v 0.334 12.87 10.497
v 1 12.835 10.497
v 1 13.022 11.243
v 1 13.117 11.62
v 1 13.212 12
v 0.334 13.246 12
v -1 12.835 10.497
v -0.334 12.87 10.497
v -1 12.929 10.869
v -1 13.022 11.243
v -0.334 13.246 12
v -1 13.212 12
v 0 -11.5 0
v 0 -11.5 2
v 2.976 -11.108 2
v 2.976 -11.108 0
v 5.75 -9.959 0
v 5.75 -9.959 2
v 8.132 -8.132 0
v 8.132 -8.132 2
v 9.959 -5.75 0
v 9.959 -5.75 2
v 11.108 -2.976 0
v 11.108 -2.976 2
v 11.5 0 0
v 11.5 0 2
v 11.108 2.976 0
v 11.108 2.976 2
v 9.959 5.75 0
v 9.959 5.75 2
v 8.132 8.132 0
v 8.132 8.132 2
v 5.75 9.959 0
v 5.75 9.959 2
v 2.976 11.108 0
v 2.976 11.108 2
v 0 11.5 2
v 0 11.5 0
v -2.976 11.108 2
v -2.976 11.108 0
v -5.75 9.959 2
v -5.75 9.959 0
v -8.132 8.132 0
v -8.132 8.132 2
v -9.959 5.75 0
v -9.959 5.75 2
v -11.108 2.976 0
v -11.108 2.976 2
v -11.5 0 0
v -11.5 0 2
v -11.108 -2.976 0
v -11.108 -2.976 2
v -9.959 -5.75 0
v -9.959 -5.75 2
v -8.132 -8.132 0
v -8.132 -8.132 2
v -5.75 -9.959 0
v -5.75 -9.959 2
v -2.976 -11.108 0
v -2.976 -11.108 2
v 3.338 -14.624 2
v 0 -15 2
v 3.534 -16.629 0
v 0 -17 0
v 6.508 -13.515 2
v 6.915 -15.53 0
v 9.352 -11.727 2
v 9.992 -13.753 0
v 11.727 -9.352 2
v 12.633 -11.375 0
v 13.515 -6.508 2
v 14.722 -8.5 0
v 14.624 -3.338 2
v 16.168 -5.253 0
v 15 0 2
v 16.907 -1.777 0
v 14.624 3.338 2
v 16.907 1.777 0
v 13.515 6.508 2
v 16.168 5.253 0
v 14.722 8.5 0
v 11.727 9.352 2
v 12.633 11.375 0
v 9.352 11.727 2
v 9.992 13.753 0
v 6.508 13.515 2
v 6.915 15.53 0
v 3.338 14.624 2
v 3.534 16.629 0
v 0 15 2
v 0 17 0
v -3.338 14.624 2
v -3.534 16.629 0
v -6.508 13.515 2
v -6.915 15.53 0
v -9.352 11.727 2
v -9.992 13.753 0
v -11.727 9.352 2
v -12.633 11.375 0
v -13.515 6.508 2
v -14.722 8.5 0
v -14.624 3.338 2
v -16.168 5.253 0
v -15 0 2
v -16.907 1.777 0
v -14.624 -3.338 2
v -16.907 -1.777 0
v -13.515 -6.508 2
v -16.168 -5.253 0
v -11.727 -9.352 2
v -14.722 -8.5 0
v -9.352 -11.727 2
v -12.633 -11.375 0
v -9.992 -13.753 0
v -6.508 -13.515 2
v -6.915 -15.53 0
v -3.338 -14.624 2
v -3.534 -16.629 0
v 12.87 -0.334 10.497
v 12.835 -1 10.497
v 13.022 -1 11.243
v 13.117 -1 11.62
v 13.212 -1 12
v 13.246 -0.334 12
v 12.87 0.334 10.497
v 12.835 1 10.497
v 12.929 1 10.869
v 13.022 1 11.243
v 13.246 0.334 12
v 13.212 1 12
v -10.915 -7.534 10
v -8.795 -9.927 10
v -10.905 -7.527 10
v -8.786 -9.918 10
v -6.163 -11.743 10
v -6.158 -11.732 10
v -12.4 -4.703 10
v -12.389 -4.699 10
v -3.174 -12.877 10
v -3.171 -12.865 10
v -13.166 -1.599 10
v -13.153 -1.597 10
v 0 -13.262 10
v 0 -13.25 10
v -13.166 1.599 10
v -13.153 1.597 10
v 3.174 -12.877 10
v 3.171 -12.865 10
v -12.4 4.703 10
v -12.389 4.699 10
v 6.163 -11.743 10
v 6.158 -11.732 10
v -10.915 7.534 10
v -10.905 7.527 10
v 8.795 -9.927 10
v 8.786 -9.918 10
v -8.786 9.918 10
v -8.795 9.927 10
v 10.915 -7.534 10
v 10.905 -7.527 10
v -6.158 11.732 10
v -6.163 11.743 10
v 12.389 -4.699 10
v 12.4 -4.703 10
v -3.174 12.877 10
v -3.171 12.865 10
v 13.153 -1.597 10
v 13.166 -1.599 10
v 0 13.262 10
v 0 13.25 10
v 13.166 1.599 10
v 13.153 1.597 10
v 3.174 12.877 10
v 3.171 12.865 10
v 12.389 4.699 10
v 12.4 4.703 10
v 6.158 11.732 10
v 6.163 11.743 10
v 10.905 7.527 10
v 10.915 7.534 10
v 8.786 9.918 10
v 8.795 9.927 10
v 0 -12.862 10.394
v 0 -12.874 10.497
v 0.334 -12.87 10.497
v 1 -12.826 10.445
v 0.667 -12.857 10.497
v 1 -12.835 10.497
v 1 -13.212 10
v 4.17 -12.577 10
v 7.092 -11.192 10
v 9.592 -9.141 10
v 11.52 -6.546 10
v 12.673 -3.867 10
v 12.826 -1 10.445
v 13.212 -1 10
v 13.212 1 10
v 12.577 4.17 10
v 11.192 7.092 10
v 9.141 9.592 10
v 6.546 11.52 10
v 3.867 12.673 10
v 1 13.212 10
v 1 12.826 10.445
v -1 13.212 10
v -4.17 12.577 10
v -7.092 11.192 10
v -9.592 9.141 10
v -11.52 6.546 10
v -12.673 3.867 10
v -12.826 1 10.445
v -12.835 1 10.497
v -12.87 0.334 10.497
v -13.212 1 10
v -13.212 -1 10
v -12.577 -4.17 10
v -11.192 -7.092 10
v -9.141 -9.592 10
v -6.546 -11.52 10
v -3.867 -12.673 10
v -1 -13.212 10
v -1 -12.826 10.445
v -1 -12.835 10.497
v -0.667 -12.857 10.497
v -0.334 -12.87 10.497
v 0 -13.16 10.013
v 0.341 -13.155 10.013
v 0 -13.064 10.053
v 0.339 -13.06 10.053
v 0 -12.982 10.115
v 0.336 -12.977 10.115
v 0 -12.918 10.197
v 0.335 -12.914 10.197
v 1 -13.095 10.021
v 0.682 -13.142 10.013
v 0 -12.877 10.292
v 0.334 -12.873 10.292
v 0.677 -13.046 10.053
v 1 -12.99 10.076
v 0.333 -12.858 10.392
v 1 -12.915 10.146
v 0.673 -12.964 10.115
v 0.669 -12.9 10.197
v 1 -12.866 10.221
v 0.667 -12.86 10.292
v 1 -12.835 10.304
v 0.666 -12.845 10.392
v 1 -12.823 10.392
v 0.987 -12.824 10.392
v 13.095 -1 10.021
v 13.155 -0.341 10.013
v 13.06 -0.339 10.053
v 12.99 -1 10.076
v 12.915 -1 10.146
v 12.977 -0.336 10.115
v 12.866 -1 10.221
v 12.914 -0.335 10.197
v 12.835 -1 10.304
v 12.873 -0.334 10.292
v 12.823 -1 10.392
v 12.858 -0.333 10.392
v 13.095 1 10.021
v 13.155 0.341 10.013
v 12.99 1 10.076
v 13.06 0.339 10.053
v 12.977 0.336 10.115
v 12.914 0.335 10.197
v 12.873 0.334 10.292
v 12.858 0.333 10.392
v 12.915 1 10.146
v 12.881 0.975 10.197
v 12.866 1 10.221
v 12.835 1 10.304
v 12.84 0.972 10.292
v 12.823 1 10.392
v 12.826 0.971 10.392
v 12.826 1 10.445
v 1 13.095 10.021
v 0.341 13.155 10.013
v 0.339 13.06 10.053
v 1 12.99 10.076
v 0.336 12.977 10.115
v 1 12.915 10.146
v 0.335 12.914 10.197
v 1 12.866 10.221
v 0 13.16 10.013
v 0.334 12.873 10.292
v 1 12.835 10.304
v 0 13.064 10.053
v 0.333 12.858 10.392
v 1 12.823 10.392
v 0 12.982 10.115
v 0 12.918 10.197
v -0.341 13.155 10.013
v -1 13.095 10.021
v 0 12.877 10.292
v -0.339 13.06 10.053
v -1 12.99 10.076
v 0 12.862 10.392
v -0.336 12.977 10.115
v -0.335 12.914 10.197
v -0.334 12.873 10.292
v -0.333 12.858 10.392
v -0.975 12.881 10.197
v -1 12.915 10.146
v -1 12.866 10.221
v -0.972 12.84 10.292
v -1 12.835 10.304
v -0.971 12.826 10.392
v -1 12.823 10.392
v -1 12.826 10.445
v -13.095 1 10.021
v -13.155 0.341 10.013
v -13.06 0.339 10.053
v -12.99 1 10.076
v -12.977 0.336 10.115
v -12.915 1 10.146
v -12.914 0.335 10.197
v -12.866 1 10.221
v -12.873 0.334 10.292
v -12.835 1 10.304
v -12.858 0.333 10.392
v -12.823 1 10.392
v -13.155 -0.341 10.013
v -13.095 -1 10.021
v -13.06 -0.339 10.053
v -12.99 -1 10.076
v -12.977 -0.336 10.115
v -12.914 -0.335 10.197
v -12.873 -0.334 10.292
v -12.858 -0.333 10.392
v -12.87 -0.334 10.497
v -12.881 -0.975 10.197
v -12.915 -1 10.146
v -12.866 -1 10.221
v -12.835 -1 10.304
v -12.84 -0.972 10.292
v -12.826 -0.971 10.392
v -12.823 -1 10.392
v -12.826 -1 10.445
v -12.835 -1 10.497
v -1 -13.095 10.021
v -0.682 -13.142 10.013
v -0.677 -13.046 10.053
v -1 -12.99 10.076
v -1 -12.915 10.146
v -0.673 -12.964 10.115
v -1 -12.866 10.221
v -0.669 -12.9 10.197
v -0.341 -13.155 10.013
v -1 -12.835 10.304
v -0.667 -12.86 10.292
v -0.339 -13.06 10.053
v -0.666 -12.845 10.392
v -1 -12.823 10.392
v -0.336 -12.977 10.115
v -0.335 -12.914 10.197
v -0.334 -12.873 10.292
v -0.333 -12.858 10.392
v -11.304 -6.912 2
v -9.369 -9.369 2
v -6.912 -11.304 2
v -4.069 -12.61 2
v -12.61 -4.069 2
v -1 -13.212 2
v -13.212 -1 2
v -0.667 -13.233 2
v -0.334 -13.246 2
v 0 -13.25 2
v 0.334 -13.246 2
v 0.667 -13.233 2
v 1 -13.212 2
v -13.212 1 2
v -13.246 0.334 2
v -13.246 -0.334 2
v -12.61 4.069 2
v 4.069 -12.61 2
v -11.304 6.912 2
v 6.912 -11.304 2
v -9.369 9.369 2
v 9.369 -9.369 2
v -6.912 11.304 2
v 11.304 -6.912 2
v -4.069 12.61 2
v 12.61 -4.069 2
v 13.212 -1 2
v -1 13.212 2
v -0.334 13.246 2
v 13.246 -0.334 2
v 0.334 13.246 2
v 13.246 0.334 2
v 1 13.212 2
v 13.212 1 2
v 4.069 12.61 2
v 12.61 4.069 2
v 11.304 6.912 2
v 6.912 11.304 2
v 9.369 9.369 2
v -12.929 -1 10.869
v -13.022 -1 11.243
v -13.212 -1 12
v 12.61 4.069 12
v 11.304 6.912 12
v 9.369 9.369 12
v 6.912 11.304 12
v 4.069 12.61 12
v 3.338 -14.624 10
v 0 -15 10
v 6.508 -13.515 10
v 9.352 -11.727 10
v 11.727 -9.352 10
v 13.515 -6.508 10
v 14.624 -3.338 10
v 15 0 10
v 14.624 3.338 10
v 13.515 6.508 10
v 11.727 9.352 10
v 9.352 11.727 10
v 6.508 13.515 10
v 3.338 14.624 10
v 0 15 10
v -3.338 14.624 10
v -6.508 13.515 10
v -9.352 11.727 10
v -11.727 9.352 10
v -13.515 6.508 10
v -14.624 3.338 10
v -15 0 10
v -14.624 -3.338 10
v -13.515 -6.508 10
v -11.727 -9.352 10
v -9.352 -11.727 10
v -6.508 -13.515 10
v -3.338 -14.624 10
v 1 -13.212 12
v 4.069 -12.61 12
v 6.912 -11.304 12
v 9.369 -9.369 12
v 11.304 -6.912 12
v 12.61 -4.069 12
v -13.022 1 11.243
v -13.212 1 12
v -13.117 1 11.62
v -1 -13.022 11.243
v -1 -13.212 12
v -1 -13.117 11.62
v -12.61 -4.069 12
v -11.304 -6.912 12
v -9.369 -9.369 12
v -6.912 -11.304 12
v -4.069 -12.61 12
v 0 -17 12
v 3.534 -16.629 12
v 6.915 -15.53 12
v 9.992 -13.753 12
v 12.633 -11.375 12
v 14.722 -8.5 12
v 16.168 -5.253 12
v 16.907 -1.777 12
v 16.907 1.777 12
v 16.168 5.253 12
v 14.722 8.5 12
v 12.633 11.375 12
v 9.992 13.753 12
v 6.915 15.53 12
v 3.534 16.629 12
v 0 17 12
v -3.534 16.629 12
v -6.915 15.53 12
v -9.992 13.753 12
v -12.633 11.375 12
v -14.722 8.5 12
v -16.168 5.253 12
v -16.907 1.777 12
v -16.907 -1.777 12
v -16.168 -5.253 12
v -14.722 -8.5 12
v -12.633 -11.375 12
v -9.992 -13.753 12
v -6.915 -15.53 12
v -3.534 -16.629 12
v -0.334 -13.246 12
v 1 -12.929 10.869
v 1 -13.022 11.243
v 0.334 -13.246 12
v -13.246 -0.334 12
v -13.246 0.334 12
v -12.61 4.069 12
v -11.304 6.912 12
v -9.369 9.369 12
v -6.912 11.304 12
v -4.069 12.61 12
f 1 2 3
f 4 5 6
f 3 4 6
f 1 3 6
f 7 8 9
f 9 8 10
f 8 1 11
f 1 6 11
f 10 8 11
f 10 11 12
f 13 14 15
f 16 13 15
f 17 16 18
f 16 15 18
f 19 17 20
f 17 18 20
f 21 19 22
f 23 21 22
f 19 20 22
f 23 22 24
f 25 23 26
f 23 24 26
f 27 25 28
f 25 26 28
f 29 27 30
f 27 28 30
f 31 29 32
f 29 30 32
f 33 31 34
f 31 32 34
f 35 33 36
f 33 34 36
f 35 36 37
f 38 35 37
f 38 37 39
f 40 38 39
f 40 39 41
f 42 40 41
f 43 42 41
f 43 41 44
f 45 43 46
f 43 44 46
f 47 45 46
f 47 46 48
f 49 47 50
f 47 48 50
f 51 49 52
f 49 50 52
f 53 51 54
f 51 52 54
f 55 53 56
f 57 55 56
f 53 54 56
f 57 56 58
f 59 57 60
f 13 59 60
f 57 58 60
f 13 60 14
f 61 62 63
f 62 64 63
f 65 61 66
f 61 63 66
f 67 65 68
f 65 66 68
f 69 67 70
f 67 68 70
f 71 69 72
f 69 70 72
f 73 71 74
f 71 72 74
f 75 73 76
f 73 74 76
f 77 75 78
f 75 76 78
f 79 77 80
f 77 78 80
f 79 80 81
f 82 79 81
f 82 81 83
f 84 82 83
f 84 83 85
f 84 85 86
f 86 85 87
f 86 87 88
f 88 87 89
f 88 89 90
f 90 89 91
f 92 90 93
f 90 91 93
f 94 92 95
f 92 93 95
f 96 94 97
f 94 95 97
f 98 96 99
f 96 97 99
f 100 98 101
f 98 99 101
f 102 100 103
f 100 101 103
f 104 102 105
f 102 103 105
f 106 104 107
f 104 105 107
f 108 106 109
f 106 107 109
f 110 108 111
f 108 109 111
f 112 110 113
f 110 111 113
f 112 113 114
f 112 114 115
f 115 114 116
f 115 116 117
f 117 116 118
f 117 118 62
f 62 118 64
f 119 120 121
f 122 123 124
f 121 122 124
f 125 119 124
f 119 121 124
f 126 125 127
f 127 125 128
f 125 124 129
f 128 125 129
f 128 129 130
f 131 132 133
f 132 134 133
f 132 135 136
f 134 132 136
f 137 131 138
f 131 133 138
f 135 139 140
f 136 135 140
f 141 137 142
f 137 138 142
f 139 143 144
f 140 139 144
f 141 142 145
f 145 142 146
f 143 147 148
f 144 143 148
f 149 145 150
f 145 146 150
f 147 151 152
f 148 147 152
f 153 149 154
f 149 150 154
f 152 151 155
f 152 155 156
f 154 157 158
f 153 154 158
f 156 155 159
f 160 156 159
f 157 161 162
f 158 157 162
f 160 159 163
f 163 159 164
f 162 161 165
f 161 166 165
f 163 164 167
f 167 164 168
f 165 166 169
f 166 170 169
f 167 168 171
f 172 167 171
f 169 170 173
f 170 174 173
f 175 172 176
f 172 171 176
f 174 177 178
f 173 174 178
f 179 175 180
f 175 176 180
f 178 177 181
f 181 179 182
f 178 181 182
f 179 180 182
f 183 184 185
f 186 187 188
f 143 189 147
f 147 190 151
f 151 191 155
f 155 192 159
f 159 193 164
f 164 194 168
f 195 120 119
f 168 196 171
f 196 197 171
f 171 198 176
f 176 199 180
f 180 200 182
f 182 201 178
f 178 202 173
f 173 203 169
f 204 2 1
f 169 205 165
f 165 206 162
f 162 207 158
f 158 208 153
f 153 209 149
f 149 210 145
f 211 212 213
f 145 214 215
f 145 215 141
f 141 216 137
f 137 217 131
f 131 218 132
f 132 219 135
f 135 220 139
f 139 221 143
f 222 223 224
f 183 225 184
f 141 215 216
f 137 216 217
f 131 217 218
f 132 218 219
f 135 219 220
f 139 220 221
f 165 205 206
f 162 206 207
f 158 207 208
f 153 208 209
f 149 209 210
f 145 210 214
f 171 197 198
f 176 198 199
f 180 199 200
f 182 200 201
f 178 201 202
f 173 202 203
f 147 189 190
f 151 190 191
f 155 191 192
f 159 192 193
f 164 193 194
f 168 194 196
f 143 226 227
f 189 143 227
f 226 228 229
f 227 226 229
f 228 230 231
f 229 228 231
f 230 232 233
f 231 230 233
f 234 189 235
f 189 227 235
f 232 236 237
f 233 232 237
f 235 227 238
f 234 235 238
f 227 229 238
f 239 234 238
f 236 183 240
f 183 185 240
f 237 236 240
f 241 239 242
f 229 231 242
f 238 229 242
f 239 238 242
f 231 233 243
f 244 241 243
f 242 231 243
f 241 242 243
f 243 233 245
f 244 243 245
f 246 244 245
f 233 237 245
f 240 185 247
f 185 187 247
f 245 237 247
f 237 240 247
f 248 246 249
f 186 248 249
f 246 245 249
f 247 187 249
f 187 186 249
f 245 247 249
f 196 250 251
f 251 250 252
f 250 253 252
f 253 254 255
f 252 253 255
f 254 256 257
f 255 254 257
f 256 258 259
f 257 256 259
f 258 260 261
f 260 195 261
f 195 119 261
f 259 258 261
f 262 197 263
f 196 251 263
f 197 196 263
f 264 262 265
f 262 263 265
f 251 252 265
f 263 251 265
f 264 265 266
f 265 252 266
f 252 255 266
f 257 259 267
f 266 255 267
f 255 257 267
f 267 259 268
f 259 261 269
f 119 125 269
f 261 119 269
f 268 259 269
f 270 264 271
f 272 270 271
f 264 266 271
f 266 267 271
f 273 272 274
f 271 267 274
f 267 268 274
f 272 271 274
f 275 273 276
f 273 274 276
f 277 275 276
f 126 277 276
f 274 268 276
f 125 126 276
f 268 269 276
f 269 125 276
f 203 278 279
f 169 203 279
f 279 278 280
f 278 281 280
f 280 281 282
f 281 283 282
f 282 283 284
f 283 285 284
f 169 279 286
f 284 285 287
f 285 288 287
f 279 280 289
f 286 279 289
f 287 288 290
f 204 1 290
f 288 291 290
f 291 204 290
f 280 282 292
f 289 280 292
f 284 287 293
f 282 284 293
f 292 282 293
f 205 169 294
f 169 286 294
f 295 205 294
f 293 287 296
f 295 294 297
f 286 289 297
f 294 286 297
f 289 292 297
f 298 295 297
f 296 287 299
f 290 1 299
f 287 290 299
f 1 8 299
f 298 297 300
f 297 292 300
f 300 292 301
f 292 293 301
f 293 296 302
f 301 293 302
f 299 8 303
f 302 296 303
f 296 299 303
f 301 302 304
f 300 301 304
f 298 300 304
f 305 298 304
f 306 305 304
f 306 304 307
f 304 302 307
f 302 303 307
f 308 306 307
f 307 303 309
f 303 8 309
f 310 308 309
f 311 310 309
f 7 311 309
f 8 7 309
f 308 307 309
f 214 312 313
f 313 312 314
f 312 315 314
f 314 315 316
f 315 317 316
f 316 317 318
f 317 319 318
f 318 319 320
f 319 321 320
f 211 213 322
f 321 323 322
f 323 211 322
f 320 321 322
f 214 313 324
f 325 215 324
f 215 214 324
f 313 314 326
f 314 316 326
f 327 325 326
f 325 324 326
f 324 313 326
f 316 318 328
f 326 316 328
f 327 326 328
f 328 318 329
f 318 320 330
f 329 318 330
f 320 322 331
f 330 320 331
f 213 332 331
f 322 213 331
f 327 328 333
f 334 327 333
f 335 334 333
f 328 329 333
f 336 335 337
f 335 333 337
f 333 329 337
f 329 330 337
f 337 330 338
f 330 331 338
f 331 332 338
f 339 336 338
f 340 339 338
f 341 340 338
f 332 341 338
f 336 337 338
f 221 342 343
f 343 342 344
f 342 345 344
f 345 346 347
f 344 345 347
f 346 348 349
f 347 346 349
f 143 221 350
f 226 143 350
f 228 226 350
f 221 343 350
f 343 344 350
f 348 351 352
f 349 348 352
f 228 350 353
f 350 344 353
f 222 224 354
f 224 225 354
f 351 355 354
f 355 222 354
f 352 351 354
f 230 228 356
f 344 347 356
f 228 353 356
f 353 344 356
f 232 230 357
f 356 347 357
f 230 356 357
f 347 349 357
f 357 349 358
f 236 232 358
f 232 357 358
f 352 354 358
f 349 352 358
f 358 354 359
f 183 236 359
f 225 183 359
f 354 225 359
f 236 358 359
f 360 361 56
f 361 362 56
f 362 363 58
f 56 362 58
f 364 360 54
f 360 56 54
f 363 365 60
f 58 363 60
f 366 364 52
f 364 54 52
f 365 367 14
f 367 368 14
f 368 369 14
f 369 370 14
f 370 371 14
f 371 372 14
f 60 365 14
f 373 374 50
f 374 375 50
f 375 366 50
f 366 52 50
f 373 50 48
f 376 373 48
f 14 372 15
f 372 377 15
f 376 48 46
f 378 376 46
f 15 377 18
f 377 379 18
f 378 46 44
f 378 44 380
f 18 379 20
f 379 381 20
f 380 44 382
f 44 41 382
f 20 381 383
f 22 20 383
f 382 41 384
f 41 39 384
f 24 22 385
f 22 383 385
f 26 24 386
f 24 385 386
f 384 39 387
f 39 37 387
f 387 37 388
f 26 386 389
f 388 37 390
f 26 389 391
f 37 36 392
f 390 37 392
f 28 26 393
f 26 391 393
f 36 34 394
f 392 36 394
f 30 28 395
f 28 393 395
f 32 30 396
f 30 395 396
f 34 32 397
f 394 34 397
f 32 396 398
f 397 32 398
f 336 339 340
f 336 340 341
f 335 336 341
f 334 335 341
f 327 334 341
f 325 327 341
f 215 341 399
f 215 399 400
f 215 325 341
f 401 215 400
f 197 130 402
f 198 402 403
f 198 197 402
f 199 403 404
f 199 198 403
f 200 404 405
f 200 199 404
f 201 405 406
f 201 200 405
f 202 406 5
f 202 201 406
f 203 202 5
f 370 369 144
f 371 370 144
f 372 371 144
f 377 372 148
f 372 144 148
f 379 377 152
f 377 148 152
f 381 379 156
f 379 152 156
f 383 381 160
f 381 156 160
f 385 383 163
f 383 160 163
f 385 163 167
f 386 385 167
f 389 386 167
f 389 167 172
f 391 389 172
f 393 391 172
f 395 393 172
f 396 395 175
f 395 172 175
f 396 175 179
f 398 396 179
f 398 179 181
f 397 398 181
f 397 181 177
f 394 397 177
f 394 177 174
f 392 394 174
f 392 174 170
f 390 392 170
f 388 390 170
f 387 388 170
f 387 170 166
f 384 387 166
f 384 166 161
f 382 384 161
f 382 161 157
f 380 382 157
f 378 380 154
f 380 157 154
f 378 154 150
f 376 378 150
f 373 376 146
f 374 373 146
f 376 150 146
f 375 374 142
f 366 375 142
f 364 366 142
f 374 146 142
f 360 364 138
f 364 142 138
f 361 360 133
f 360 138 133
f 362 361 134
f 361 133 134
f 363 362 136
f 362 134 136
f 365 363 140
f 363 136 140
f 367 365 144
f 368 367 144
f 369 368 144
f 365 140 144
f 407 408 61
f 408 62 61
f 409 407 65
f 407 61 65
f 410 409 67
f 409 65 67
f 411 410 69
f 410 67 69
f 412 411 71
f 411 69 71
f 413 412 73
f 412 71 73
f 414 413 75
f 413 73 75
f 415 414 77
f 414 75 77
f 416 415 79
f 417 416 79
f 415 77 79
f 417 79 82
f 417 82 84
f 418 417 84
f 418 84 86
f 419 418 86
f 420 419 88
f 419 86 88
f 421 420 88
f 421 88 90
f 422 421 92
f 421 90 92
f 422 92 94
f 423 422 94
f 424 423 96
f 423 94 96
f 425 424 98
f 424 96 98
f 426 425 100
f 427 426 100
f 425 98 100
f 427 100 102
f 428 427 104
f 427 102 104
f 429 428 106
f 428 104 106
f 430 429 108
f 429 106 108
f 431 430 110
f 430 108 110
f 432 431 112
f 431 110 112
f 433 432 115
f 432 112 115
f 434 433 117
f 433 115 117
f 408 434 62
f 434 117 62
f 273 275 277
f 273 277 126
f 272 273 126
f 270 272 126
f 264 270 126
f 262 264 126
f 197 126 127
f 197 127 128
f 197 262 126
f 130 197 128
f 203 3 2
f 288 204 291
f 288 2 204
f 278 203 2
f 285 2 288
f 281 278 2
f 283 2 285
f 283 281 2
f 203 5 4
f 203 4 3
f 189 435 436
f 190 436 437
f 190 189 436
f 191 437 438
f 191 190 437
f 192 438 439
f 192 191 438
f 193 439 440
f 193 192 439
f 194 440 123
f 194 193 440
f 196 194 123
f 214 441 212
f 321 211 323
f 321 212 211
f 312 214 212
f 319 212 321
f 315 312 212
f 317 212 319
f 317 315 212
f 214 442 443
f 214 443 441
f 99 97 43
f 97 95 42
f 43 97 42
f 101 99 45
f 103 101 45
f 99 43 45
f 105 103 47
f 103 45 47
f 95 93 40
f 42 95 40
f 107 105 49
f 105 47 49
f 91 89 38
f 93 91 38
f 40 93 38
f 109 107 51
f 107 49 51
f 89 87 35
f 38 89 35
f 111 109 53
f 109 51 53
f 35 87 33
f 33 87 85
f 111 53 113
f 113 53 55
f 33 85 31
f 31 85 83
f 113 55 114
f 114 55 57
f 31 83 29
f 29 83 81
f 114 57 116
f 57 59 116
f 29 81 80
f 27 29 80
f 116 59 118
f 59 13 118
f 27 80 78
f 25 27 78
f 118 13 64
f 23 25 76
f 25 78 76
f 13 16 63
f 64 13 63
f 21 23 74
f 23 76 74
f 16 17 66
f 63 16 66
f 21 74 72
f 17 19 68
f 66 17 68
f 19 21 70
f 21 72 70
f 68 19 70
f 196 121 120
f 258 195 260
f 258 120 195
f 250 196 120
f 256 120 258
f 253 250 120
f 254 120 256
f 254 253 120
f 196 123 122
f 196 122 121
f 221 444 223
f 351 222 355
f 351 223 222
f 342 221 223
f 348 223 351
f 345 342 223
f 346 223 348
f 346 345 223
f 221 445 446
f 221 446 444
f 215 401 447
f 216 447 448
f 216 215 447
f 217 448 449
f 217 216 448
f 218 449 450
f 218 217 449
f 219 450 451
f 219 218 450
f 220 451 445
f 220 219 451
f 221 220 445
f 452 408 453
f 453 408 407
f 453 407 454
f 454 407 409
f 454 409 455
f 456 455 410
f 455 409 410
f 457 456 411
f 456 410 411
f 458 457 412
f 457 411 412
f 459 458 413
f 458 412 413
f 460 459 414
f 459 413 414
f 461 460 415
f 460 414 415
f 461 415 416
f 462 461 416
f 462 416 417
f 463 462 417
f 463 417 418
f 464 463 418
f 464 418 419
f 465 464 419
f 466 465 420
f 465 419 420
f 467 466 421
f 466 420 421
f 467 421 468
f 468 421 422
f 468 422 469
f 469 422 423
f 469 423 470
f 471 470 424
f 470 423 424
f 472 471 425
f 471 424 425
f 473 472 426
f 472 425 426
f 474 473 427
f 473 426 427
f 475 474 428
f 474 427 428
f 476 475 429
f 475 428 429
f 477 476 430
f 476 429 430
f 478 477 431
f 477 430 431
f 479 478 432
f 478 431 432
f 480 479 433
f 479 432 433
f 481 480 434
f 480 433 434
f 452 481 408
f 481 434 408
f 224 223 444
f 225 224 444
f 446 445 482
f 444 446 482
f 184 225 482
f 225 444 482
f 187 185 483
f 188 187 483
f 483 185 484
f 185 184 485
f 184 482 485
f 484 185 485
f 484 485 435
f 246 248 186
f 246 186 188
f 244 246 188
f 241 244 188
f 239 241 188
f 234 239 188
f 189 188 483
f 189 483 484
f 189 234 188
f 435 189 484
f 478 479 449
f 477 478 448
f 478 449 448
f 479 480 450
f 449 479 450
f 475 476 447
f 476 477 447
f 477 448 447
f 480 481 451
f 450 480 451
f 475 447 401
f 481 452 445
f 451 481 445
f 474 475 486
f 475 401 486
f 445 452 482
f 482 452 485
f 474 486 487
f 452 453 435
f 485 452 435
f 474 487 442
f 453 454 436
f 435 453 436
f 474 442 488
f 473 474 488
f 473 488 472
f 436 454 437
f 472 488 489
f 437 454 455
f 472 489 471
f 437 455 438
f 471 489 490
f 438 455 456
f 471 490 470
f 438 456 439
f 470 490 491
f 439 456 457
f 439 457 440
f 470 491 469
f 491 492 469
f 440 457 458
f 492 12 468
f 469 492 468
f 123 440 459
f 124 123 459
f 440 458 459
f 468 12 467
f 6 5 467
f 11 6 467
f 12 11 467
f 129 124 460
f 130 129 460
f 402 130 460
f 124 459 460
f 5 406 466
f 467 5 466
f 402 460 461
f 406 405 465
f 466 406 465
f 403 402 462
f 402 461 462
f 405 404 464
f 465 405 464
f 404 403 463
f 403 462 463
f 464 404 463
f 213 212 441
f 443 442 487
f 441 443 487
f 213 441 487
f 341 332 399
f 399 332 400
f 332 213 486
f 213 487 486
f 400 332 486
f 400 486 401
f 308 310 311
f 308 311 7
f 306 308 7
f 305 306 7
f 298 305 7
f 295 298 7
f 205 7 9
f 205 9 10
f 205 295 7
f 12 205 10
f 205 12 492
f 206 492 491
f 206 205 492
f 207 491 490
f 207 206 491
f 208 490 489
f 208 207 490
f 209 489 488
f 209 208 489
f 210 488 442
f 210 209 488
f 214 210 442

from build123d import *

# Parameters (mm, degrees)
F3_START = 2
F3_DEPTH = 10.001


with BuildPart() as f1:
    # F0 (on Right) → F1 (revolve)
    with BuildSketch(Plane.YZ):
        with BuildLine():
            Line((-17, 0), (-11.5, 0))
            Line((-11.5, 0), (-11.5, 2))
            Line((-11.5, 2), (-13.25, 2))
            Line((-13.25, 2), (-13.25, 10))
            Line((-13.25, 10), (-13.2623105626, 10))
            ThreePointArc((-13.2623105626, 10), (-12.9470283874, 10.1538351162), (-12.8742535625, 10.49701425))
            Line((-12.8742535625, 10.49701425), (-13.25, 12))
            Line((-13.25, 12), (-17, 12))
            Line((-17, 12), (-15, 10))
            Line((-15, 10), (-15, 2))
            Line((-15, 2), (-17, 0))
        make_face()
    revolve(axis=Axis((0, 0, 6), (0, 0, 1)))

    # F2 (on Top) → F3 (cut)
    with BuildSketch(Plane.XY.offset(F3_START)):
        with BuildLine():
            ThreePointArc((-1, 13.2122102617), (-9.3691648507, 9.3691648507), (-13.2122102617, 1))
            Line((-13.2122102617, 1), (-1, 1))
            Line((-1, 1), (-1, 13.2122102617))
        make_face()
        with BuildLine():
            ThreePointArc((13.2122102617, 1), (9.3691648507, 9.3691648507), (1, 13.2122102617))
            Line((1, 13.2122102617), (1, 1))
            Line((1, 1), (13.2122102617, 1))
        make_face()
        with BuildLine():
            Line((1, -1), (1, -13.2122102617))
            ThreePointArc((1, -13.2122102617), (9.3691648507, -9.3691648507), (13.2122102617, -1))
            Line((13.2122102617, -1), (1, -1))
        make_face()
        with BuildLine():
            Line((-1, -1), (-13.2122102617, -1))
            ThreePointArc((-13.2122102617, -1), (-9.3691648507, -9.3691648507), (-1, -13.2122102617))
            Line((-1, -13.2122102617), (-1, -1))
        make_face()
    extrude(amount=F3_DEPTH, mode=Mode.SUBTRACT)


solid = f1.part
